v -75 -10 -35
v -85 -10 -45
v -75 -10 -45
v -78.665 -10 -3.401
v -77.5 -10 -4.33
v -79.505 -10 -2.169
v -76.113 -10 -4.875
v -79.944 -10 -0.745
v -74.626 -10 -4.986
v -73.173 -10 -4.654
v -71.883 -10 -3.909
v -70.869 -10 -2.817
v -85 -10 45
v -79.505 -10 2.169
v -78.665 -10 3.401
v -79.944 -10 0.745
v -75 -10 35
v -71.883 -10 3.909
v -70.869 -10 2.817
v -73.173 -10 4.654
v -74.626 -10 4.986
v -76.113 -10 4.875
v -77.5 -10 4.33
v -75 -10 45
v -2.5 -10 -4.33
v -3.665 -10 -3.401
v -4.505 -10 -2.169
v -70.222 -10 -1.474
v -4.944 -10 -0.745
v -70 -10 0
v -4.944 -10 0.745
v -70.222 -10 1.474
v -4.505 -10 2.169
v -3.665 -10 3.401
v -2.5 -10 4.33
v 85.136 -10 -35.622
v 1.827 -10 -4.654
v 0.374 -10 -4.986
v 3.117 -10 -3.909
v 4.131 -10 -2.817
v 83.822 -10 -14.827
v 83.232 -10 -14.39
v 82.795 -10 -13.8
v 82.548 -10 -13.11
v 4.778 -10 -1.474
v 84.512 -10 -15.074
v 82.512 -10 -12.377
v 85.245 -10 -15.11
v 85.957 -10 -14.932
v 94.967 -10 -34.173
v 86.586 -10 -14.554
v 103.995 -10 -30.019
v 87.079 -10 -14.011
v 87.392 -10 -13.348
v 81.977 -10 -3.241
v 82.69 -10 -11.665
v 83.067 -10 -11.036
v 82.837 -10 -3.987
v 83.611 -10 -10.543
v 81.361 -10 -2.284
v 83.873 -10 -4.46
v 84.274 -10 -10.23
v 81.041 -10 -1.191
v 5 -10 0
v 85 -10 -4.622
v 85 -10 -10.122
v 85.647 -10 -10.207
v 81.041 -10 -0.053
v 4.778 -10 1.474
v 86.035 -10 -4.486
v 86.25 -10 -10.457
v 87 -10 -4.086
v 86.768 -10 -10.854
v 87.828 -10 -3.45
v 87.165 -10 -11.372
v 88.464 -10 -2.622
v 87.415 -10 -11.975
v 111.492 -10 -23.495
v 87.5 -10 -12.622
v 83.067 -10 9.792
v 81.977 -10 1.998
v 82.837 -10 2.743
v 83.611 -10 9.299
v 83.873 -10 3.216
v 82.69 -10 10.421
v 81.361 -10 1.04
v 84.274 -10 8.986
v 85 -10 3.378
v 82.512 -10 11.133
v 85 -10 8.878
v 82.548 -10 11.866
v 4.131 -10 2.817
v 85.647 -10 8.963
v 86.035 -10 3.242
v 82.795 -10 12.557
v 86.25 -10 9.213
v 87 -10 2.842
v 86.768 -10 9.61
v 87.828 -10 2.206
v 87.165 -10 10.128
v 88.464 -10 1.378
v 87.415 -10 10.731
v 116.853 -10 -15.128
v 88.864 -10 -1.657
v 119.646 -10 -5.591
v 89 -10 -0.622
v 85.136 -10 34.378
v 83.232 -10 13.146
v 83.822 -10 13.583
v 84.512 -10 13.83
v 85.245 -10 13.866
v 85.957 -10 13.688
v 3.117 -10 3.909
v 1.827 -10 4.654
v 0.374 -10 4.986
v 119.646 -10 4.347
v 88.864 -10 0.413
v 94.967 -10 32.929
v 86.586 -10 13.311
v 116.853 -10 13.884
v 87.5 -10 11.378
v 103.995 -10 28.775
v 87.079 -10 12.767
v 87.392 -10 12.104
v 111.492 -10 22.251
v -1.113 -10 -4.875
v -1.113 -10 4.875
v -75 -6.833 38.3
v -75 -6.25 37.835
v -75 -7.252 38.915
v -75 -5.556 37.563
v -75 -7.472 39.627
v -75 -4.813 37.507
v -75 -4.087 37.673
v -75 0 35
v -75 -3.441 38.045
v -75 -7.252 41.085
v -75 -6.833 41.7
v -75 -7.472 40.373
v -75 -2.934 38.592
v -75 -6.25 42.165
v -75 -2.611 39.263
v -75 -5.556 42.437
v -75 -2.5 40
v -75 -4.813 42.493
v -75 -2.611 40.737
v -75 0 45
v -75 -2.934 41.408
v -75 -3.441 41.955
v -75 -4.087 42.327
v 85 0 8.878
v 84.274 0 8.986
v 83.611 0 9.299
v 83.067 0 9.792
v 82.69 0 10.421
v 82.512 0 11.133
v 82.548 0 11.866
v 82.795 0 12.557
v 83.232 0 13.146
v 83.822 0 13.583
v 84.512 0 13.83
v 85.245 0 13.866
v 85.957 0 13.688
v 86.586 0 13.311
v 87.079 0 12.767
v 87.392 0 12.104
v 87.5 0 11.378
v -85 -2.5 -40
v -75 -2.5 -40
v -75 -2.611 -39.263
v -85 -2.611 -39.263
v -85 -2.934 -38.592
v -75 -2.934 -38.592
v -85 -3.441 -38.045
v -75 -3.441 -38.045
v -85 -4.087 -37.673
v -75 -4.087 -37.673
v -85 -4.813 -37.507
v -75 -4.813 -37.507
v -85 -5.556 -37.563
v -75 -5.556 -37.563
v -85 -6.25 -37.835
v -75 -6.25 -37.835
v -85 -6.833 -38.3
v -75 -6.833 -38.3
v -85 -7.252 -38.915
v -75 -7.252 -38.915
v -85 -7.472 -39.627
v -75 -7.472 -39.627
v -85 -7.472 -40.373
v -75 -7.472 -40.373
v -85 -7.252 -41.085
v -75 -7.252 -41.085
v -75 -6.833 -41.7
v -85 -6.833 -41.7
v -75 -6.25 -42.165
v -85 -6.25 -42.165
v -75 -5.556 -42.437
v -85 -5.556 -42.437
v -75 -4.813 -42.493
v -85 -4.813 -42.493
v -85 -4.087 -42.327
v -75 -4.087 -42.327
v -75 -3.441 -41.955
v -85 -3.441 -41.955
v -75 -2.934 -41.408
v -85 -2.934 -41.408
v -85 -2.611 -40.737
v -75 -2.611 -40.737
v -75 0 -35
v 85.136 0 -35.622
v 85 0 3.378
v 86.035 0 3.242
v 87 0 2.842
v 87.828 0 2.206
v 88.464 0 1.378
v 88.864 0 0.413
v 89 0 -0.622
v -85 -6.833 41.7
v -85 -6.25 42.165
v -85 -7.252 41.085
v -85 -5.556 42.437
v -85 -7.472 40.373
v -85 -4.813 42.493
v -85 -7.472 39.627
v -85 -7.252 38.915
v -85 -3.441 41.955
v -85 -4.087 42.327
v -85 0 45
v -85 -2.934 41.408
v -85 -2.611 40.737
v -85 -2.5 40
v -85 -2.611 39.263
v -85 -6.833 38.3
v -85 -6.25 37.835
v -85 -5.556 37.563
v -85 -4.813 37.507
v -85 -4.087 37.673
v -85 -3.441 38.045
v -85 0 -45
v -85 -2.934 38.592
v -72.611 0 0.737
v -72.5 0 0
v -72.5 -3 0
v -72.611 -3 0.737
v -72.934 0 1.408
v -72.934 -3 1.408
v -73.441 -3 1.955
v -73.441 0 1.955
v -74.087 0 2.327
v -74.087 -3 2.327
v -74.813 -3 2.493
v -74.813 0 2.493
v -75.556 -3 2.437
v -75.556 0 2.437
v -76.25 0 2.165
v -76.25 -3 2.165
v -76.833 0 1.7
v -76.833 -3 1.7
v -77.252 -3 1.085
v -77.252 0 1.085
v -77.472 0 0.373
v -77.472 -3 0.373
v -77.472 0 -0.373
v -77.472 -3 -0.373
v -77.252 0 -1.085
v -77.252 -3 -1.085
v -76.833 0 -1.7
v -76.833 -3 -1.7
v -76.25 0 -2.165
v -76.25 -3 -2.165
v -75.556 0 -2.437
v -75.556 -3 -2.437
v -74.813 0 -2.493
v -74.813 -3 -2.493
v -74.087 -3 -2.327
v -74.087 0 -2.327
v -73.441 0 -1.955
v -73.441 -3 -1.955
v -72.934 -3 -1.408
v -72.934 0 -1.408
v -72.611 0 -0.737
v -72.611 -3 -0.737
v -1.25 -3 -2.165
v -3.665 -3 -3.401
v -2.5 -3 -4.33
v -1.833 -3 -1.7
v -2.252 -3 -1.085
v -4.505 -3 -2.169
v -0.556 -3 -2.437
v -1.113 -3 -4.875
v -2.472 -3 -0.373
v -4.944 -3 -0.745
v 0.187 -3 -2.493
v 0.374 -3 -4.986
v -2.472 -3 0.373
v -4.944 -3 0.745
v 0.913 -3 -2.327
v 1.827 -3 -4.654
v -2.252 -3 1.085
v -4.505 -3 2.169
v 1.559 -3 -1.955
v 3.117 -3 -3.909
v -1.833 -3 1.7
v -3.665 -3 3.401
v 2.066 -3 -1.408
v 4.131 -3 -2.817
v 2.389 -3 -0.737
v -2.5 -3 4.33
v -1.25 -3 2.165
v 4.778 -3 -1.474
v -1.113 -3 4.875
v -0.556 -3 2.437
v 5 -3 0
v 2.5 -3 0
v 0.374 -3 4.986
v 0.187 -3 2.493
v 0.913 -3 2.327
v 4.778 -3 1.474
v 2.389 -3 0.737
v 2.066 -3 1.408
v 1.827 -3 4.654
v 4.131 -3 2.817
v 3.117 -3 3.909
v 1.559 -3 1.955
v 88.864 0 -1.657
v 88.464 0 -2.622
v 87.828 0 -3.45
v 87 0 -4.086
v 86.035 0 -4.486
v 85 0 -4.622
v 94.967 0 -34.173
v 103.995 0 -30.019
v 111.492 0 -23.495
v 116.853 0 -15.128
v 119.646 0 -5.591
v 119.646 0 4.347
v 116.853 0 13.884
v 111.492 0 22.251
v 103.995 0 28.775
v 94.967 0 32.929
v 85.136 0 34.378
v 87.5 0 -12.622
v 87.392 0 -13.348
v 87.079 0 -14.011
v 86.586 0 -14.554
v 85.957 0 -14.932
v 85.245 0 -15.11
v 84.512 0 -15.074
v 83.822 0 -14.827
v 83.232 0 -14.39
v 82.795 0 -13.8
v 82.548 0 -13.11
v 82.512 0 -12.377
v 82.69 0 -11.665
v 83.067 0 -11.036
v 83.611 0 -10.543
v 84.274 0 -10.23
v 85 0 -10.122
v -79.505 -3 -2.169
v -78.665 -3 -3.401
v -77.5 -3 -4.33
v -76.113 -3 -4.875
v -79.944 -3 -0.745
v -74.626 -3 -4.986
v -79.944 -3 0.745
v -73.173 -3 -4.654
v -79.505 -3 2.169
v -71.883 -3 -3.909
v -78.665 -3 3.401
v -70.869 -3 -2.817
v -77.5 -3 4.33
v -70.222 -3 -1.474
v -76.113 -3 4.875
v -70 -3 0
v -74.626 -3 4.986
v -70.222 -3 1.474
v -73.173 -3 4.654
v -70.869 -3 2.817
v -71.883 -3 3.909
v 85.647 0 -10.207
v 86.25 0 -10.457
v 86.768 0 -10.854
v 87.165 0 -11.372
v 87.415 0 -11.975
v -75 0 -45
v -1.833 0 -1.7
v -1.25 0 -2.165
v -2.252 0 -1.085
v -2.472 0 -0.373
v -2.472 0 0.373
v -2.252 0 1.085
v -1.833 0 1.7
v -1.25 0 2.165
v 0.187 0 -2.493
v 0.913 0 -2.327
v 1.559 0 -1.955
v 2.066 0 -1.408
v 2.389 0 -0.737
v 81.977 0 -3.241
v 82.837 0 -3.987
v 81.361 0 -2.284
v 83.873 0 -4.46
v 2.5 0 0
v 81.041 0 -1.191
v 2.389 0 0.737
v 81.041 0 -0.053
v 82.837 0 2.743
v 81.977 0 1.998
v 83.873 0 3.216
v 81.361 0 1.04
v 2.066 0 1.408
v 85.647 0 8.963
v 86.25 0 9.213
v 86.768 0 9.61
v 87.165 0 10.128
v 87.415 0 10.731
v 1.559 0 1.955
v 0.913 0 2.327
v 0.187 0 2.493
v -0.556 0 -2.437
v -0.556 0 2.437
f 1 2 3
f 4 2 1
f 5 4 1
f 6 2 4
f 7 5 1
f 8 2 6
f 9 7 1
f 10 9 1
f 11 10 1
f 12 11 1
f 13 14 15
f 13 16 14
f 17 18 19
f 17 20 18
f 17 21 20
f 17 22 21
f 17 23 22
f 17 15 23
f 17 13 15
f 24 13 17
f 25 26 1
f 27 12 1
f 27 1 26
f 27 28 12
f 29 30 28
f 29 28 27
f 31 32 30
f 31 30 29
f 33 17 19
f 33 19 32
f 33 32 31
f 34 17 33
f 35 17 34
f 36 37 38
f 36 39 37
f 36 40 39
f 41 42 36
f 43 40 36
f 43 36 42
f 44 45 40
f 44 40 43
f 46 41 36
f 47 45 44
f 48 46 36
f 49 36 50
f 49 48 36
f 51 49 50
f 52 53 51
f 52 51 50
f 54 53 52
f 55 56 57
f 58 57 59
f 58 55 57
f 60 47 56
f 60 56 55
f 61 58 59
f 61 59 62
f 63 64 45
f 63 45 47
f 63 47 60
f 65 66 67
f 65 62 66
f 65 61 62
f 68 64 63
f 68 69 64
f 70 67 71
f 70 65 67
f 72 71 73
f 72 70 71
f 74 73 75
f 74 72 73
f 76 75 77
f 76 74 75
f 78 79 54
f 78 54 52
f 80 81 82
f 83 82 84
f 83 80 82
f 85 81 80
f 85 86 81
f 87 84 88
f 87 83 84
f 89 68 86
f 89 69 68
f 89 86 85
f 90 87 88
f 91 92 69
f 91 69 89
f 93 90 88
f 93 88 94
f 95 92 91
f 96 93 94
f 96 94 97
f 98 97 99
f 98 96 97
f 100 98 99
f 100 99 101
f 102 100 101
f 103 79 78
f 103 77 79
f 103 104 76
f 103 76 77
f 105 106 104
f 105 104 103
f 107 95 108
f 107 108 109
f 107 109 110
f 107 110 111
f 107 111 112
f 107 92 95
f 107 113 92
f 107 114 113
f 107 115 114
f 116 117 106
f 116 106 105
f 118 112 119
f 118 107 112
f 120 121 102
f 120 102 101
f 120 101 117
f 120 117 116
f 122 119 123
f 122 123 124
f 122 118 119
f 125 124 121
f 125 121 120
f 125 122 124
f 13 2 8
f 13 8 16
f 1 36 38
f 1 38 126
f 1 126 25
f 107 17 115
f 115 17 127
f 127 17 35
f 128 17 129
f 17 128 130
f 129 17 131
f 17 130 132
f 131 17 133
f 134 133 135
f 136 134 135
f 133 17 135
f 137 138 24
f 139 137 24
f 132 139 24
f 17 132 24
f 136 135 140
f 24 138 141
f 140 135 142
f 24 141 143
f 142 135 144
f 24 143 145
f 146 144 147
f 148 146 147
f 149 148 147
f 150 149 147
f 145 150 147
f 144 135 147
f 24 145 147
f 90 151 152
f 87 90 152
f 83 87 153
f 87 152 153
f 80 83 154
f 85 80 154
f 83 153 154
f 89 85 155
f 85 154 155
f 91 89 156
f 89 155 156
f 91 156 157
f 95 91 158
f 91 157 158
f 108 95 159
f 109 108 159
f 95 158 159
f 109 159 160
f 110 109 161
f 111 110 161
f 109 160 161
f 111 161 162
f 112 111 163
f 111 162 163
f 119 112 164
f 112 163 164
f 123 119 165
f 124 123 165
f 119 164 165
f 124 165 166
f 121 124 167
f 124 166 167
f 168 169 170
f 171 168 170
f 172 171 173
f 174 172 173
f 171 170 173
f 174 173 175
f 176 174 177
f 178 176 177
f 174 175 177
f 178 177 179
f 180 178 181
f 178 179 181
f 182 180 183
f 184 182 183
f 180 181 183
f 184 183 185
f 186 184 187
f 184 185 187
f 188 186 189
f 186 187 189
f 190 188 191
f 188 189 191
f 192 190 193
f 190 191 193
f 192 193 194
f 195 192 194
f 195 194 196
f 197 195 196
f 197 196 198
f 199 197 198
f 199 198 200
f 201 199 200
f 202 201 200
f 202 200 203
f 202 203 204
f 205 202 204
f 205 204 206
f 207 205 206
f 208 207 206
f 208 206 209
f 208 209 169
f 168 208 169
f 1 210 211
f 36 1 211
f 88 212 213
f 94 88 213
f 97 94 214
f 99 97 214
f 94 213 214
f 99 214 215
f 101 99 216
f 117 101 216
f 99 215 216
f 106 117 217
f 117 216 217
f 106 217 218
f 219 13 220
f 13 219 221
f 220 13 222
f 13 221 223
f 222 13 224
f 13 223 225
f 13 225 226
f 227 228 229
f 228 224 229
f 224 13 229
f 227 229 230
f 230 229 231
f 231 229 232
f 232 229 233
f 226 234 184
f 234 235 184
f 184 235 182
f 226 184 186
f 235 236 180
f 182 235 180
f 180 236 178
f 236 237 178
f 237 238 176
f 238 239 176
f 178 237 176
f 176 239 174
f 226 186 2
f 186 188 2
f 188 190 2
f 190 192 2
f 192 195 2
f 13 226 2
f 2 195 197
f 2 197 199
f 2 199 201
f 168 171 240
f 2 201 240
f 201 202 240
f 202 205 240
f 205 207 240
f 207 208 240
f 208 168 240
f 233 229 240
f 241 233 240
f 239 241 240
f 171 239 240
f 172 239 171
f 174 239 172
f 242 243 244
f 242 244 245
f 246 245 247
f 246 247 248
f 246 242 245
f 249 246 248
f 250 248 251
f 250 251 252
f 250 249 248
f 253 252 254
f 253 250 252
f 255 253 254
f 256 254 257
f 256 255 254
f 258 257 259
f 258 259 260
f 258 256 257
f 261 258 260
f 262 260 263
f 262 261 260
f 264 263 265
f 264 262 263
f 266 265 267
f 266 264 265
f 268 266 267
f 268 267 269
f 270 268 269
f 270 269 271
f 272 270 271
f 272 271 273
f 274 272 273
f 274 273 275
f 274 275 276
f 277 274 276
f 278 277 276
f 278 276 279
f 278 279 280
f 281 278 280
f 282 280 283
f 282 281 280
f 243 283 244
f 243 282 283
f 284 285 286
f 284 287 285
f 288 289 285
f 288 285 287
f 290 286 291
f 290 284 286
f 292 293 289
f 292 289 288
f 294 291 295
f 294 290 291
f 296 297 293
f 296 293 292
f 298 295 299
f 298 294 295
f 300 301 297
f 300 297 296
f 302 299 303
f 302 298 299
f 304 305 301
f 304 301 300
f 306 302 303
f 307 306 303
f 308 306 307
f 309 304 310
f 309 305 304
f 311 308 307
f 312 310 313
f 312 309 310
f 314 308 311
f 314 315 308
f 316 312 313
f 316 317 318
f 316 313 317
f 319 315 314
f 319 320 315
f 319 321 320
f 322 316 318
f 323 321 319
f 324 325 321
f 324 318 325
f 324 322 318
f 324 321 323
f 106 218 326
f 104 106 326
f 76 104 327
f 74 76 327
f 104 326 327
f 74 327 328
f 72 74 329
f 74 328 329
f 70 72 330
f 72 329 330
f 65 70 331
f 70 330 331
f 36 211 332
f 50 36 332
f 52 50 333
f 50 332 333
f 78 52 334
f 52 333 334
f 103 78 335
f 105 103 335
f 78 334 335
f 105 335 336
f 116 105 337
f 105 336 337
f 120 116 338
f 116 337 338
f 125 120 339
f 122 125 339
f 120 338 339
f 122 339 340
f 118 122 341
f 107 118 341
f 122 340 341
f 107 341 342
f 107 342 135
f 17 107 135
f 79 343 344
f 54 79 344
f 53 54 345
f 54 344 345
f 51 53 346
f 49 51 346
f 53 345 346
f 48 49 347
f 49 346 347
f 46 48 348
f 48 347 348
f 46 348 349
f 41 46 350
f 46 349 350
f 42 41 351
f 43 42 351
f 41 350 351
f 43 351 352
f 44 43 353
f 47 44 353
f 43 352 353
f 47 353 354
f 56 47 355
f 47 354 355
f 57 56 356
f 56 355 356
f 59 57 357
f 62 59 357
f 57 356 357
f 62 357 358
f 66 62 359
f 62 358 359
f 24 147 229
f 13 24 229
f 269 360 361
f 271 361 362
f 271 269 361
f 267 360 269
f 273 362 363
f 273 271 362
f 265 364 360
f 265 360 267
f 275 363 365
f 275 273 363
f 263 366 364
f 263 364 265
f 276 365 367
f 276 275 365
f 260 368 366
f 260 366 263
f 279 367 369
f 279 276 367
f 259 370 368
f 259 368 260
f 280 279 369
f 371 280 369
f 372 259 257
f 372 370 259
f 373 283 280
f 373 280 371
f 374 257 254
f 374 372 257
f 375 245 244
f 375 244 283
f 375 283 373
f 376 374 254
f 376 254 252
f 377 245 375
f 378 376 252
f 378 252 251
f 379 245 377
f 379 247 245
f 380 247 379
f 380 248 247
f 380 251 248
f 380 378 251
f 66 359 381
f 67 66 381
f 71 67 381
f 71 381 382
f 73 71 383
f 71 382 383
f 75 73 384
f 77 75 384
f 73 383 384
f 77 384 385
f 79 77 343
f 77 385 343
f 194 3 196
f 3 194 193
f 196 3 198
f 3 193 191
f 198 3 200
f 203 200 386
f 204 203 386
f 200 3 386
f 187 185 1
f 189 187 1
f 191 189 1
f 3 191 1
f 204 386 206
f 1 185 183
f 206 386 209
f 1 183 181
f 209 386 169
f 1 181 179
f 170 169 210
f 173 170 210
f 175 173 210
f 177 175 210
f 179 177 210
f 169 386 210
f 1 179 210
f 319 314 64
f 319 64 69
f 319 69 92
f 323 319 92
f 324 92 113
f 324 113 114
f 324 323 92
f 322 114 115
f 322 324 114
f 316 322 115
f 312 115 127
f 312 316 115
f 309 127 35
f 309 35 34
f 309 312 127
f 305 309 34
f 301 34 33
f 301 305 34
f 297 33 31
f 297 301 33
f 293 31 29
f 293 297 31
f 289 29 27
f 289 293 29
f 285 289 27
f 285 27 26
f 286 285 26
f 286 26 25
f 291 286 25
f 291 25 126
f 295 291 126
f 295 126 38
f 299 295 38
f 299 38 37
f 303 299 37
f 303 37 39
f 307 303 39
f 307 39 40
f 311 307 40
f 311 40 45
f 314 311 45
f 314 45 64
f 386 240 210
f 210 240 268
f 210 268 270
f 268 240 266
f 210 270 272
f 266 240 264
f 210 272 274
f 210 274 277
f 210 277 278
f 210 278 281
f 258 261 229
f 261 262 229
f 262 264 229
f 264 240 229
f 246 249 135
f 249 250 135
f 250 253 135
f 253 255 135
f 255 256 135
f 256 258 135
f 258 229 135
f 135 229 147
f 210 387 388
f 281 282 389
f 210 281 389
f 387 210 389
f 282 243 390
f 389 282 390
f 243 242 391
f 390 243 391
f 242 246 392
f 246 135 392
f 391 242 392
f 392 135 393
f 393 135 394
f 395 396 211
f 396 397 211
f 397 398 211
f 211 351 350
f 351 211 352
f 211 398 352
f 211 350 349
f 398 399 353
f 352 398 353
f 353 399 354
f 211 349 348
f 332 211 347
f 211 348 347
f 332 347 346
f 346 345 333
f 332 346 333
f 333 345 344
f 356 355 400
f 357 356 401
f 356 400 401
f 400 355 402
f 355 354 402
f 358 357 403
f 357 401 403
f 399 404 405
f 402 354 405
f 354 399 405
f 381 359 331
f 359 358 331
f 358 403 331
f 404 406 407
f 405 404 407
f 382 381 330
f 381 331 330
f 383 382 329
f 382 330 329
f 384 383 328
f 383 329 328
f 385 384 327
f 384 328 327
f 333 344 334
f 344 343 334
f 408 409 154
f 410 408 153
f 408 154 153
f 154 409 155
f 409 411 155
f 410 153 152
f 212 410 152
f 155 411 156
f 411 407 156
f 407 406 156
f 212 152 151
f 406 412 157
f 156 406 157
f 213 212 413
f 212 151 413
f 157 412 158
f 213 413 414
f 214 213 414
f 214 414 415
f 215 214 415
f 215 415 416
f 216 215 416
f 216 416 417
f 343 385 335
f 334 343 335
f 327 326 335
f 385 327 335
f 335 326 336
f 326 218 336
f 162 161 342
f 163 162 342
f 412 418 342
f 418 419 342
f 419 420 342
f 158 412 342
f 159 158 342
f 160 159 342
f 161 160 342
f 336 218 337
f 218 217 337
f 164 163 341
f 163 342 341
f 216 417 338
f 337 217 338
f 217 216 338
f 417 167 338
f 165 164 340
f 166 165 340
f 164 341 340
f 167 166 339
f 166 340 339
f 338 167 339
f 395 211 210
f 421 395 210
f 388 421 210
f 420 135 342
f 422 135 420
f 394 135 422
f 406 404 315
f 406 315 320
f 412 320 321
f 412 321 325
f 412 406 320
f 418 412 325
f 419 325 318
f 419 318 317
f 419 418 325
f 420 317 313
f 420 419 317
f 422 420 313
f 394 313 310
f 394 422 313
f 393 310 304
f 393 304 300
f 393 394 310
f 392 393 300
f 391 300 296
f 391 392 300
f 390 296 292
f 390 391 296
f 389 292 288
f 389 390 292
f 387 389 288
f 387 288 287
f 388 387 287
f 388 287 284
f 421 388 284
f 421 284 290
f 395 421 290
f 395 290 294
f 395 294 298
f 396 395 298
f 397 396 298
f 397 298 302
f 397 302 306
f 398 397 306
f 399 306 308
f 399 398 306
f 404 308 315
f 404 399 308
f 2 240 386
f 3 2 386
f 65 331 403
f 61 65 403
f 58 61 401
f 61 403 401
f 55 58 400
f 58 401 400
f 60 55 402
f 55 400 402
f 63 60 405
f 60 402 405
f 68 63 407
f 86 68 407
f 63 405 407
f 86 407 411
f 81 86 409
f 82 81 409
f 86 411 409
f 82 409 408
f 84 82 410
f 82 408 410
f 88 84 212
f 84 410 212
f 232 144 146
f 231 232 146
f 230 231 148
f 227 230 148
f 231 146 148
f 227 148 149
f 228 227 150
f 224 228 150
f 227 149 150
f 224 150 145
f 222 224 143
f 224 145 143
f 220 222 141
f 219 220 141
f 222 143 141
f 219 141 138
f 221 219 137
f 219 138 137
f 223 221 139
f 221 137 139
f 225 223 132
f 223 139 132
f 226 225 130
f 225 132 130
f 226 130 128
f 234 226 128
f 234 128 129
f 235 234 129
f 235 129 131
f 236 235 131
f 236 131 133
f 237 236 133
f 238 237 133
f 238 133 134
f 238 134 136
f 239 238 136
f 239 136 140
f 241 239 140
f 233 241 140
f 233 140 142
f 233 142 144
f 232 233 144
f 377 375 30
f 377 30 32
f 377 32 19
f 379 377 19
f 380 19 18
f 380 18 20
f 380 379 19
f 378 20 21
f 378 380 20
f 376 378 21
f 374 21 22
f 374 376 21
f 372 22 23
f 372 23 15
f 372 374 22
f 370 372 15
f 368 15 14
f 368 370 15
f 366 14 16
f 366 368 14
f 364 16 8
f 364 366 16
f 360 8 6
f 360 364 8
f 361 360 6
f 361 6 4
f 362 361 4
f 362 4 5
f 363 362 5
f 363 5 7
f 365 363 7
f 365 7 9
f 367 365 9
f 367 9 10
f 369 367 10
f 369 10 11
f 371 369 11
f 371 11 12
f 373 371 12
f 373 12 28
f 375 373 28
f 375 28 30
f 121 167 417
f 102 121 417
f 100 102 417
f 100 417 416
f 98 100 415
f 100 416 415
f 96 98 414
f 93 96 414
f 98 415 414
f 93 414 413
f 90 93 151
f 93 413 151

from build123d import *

# Parameters (mm, degrees)
F0_R     = 5
F1_DEPTH = 10
F2_R     = 2.5
F3_DEPTH = 25
F4_R     = 2.5
F5_DEPTH = 25
F0_R_2   = 2.5
F6_DEPTH = 3


with BuildPart() as f1:
    # F0 (on Front) → F1 (new body)
    with BuildSketch(Plane.XZ):
        with BuildLine():
            Line((-75, 45), (-85, 45))
            Line((-85, 45), (-85, -45))
            Line((-85, -45), (-75, -45))
            Line((-75, -45), (-75, -35))
            Line((-75, -35), (85.1359899874, -35.6216732085))
            ThreePointArc((85.1359899874, -35.6216732085), (120, -0.6219373992), (85.1359899874, 34.3777984101))
            Line((85.1359899874, 34.3777984101), (-75, 35))
            Line((-75, 35), (-75, 45))
        make_face()
        with BuildLine():
            ThreePointArc((87.5, -12.6219373992), (83.232233047, -14.3897043522), (85, -10.1219373992))
            ThreePointArc((85, -10.1219373992), (86.767766953, -10.8541704462), (87.5, -12.6219373992))
        make_face(mode=Mode.SUBTRACT)
        with BuildLine():
            ThreePointArc((85, 3.3780626008), (87.8284271247, 2.2064897255), (89, -0.6219373992))
            ThreePointArc((89, -0.6219373992), (87.8284271247, -3.450364524), (85, -4.6219373992))
            ThreePointArc((85, -4.6219373992), (81, -0.6219373992), (85, 3.3780626008))
        make_face(mode=Mode.SUBTRACT)
        with Locations((-75, 0)):
            Circle(F0_R, mode=Mode.SUBTRACT)
        Circle(F0_R, mode=Mode.SUBTRACT)
        with BuildLine():
            ThreePointArc((87.5, 11.3780626008), (86.767766953, 9.6102956478), (85, 8.8780626008))
            ThreePointArc((85, 8.8780626008), (83.232233047, 13.1458295538), (87.5, 11.3780626008))
        make_face(mode=Mode.SUBTRACT)
    extrude(amount=F1_DEPTH)

    # F2 (on face) → F3 (cut)
    with BuildSketch(Plane.YZ.offset(-75)):
        with Locations((-5, 40)):
            Circle(F2_R)
    extrude(amount=-F3_DEPTH, mode=Mode.SUBTRACT)

    # F4 (on face) → F5 (cut)
    with BuildSketch(Plane.YZ.offset(-75)):
        with Locations((-5, -40)):
            Circle(F4_R)
    extrude(amount=-F5_DEPTH, mode=Mode.SUBTRACT)

    # F0 (on Front) → F6 (join)
    with BuildSketch(Plane.XZ):
        with Locations((-75, 0)):
            Circle(F0_R)
        with Locations((-75, 0)):
            Circle(F0_R_2, mode=Mode.SUBTRACT)
        Circle(F0_R)
        Circle(F0_R_2, mode=Mode.SUBTRACT)
    extrude(amount=F6_DEPTH)


solid = f1.part
